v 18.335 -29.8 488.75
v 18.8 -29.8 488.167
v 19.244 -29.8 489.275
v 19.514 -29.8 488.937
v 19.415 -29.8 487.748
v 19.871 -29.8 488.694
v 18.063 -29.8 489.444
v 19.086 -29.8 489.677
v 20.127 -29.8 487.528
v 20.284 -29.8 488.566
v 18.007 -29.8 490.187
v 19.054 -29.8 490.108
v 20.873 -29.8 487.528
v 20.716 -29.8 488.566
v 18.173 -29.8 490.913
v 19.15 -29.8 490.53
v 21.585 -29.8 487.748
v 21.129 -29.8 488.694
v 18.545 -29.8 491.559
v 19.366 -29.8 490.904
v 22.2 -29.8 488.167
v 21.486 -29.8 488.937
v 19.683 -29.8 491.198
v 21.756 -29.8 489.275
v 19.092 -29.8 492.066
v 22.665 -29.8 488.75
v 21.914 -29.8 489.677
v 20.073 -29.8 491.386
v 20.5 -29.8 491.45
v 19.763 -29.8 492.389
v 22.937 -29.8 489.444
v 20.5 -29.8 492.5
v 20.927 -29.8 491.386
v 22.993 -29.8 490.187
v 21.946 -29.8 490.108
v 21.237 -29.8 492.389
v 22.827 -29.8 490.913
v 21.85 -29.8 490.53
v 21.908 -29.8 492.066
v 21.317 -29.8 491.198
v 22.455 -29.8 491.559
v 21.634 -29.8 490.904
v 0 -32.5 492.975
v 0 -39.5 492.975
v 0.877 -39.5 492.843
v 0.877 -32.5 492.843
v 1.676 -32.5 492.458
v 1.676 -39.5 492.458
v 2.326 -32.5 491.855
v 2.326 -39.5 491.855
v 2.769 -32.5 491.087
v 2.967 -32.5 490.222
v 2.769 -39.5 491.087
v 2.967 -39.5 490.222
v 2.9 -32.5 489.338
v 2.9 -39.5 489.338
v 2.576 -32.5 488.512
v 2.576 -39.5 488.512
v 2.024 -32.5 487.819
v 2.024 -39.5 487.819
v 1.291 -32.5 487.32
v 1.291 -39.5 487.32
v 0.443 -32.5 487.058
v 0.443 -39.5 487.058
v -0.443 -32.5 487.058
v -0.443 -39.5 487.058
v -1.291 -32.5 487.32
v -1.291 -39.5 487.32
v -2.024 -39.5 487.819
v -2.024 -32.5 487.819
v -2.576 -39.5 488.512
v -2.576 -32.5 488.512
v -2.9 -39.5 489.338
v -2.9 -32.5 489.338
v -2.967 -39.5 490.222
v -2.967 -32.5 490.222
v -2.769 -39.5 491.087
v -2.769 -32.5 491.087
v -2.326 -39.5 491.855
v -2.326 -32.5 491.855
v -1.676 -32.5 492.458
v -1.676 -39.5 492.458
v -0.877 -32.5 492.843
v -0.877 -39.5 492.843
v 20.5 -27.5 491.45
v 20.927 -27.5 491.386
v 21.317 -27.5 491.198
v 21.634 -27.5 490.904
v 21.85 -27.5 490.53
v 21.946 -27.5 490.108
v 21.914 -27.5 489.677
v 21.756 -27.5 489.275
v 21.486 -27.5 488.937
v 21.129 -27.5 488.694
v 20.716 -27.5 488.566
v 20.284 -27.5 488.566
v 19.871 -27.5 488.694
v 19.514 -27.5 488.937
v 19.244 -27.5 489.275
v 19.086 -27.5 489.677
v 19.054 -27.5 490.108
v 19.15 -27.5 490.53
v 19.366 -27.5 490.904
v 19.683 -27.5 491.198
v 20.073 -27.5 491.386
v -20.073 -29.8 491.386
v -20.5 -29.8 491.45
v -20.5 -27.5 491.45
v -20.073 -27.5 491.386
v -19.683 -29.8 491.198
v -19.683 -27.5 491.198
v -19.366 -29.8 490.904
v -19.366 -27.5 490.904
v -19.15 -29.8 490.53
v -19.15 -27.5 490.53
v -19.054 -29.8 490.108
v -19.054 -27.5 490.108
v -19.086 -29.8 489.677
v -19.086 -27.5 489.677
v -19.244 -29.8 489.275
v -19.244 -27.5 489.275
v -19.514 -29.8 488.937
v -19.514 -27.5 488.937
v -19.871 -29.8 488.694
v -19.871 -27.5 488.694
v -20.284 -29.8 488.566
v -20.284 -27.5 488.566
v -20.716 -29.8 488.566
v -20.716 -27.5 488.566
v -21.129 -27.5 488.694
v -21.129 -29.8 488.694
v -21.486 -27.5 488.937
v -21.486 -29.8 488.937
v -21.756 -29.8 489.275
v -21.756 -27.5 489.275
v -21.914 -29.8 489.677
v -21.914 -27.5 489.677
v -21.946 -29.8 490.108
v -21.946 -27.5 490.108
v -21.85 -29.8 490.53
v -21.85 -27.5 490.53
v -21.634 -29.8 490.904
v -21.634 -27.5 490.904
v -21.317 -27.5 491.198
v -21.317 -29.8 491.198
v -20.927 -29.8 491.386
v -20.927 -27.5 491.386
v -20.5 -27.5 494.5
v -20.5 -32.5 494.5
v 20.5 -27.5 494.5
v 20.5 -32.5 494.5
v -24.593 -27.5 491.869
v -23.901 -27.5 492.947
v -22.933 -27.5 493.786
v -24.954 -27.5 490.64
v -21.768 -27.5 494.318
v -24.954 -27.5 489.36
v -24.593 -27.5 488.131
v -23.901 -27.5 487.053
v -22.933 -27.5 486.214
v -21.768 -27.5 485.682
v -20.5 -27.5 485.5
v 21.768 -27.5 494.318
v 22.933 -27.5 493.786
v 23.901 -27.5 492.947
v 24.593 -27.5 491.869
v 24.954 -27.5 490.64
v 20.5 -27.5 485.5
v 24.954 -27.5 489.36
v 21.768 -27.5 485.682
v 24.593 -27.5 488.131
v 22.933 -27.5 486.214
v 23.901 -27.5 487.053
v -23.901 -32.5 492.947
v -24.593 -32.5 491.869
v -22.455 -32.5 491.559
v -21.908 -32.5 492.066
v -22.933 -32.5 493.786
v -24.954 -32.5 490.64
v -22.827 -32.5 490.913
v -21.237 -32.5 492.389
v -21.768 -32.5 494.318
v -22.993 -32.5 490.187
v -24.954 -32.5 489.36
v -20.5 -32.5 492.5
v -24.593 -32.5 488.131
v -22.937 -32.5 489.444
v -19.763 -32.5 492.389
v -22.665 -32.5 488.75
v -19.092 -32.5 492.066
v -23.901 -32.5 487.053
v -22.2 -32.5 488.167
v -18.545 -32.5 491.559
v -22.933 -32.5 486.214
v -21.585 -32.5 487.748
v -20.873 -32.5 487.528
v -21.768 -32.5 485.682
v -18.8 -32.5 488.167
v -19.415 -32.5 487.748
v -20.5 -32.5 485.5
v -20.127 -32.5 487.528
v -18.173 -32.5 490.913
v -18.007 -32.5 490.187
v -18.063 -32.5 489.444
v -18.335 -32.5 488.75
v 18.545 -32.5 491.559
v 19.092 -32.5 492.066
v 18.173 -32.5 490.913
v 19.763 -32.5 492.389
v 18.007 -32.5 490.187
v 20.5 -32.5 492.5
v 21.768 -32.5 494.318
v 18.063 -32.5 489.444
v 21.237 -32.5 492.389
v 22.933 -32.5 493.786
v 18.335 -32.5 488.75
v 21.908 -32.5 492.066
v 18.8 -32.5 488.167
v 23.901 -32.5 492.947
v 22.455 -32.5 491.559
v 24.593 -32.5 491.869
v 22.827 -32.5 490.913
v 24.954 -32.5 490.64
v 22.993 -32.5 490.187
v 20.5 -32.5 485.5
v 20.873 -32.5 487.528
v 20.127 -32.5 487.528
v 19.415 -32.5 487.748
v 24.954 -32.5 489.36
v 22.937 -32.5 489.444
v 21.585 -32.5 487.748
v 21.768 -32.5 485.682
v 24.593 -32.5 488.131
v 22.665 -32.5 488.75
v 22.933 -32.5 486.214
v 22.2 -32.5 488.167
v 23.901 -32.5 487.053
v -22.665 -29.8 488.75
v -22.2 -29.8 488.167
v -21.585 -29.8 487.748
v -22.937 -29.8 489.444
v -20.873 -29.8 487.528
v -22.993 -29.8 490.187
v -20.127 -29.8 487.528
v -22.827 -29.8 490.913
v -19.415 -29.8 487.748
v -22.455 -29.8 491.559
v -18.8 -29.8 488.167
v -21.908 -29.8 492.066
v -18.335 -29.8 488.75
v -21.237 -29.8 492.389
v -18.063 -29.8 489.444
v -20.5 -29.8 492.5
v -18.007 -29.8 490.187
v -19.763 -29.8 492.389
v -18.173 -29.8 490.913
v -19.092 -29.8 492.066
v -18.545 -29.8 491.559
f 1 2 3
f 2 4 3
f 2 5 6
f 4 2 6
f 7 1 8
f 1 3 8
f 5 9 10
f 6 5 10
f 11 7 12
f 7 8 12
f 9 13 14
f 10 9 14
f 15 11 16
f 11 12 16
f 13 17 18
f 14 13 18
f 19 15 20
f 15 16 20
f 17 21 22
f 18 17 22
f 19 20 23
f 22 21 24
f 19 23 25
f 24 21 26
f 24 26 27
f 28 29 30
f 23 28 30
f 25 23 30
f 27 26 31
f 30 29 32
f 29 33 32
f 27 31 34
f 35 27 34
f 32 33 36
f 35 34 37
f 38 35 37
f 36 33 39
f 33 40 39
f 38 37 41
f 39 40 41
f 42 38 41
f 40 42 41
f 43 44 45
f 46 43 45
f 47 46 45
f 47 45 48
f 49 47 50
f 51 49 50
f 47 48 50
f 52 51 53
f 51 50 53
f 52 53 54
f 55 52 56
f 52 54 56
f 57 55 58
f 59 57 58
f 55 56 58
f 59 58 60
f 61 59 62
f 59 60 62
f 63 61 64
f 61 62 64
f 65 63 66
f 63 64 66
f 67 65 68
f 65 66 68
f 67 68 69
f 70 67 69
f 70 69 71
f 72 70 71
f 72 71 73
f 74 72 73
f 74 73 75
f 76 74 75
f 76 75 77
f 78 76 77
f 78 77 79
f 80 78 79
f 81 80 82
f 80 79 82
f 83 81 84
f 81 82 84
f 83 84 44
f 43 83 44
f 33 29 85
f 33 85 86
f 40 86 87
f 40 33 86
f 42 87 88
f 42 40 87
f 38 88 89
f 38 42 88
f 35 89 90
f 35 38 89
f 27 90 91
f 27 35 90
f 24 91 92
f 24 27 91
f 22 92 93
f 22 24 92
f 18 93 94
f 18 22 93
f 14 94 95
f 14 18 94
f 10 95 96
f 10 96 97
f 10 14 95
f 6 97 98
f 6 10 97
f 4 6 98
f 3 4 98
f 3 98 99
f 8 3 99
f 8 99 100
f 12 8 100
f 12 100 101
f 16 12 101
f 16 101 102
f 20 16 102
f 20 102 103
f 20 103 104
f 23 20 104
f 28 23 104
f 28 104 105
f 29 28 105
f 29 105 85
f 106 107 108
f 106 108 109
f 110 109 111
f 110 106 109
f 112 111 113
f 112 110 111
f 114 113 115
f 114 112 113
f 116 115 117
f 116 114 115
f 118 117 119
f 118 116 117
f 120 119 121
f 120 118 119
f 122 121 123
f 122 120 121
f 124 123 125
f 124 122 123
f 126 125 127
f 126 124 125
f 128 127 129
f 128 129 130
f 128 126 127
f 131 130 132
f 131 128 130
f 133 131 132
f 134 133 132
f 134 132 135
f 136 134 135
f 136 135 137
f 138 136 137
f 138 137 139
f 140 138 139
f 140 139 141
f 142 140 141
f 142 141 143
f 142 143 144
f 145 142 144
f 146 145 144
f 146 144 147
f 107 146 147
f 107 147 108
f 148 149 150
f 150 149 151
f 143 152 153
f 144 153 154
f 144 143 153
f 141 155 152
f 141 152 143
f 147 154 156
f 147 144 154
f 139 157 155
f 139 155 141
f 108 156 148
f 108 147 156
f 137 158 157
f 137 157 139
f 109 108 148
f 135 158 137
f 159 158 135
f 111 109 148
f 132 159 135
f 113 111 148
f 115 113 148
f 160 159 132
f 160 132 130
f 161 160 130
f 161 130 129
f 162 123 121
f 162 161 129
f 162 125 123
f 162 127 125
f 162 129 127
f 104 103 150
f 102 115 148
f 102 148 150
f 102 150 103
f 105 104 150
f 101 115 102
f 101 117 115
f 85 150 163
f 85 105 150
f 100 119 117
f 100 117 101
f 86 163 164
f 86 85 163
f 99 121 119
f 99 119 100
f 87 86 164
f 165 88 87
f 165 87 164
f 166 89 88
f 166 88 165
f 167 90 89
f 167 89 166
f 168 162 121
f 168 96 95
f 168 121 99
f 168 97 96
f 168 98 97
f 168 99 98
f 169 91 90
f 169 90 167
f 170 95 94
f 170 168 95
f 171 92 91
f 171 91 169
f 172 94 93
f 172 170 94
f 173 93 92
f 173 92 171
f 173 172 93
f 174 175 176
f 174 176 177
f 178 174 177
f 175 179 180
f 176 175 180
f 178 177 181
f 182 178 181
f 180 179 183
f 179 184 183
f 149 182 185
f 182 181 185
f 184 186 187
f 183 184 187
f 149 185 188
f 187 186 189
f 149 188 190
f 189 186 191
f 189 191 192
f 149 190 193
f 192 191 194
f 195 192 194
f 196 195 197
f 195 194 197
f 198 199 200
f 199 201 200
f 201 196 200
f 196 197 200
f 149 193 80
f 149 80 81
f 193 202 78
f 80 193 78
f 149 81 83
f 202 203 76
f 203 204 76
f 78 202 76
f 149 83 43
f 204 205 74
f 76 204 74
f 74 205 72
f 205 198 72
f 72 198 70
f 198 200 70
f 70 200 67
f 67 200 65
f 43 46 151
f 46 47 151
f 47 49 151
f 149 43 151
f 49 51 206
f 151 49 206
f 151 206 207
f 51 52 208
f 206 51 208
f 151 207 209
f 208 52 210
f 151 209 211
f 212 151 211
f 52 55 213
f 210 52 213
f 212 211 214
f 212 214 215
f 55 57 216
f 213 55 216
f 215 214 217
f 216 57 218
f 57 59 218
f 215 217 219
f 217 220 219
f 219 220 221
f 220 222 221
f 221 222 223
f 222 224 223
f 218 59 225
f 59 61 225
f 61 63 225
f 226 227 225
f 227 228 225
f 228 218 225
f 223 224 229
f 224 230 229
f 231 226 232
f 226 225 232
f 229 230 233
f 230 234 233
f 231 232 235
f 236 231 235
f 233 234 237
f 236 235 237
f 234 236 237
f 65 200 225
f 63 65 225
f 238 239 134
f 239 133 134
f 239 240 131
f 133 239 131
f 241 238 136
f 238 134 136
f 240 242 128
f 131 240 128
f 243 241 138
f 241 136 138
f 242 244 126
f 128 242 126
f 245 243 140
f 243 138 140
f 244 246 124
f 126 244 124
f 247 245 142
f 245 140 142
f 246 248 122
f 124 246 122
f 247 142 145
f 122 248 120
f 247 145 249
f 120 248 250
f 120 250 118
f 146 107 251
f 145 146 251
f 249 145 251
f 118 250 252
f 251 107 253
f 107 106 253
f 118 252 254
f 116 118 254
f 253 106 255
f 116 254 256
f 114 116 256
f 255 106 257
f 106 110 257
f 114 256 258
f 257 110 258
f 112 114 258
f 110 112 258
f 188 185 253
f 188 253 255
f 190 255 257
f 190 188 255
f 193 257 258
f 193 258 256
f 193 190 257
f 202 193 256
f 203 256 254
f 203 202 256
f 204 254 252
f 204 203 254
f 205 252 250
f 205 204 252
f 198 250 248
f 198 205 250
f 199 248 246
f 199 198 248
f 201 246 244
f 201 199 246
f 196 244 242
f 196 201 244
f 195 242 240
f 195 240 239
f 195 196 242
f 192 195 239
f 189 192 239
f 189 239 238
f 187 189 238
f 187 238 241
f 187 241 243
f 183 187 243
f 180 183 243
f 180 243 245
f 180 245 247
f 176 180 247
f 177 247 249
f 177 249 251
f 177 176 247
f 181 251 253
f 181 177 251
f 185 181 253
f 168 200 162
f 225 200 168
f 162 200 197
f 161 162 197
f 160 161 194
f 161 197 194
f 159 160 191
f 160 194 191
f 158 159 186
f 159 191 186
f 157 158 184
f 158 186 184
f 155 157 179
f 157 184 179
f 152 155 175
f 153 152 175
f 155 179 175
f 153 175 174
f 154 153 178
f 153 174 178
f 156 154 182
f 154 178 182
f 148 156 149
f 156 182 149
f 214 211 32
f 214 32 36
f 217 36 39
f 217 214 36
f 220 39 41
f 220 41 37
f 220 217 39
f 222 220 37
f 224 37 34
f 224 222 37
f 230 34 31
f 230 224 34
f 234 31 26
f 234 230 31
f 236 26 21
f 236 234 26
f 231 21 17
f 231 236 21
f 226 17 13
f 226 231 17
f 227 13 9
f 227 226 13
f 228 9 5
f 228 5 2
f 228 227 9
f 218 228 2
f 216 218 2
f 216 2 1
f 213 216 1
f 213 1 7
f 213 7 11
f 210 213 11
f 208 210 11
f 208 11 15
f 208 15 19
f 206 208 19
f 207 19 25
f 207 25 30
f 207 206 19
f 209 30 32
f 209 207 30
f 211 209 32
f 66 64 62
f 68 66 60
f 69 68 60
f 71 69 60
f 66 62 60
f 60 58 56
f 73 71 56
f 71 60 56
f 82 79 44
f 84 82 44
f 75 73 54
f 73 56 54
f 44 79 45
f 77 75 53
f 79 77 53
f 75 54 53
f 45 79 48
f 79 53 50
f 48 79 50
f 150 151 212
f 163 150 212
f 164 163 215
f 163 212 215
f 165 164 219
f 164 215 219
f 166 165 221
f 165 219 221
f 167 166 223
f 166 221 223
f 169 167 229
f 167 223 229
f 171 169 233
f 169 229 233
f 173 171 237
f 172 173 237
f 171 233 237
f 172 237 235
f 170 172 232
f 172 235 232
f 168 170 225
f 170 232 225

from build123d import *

# Parameters (mm, degrees)
BARRA_START         = -32.5
SK_BARRA_W          = 41
SK_BARRA_H          = 9
BARRA_DEPTH         = 5
EXTREMOS_START      = -32.5
SK_EXTREMOS_R       = 4.5
EXTREMOS_DEPTH      = 5
PERNO_696_START     = -39.5
SK_PERNO_696_R      = 2.975
PERNO_696_DEPTH     = 7
PASANTES_M2_5_START = -32.5
SK_PASANTES_M2_5_R  = 1.45
PASANTES_M2_5_DEPTH = 5
CAJAS_M2_5_START    = -32.5
SK_CAJAS_M2_5_R     = 2.5
CAJAS_M2_5_DEPTH    = 2.7


with BuildPart() as part:
    # Sk_Barra → Barra (new body)
    with BuildSketch(Plane(origin=(0, 0, 0), x_dir=(1, 0, 0), z_dir=(0, 1, 0)).offset(BARRA_START)):
        with Locations((0, -490)):
            Rectangle(SK_BARRA_W, SK_BARRA_H)
    extrude(amount=BARRA_DEPTH)

    # Sk_Extremos → Extremos (add)
    with BuildSketch(Plane(origin=(0, 0, 0), x_dir=(1, 0, 0), z_dir=(0, 1, 0)).offset(EXTREMOS_START)):
        with Locations((-20.5, -490)):
            Circle(SK_EXTREMOS_R)
        with Locations((20.5, -490)):
            Circle(SK_EXTREMOS_R)
    extrude(amount=EXTREMOS_DEPTH)

    # Sk_Perno_696 → Perno_696 (add)
    with BuildSketch(Plane(origin=(0, 0, 0), x_dir=(1, 0, 0), z_dir=(0, 1, 0)).offset(PERNO_696_START)):
        with Locations(Location((0, -490, 0), (0, 0, 270))):
            Circle(SK_PERNO_696_R)
    extrude(amount=PERNO_696_DEPTH)

    # Sk_Pasantes_M2-5 → Pasantes_M2-5 (cut)
    with BuildSketch(Plane(origin=(0, 0, 0), x_dir=(1, 0, 0), z_dir=(0, 1, 0)).offset(PASANTES_M2_5_START)):
        with Locations(Location((-20.5, -490, 0), (0, 0, 270))):
            Circle(SK_PASANTES_M2_5_R)
        with Locations(Location((20.5, -490, 0), (0, 0, 270))):
            Circle(SK_PASANTES_M2_5_R)
    extrude(amount=PASANTES_M2_5_DEPTH, mode=Mode.SUBTRACT)

    # Sk_Cajas_M2-5 → Cajas_M2-5 (cut)
    with BuildSketch(Plane(origin=(0, 0, 0), x_dir=(1, 0, 0), z_dir=(0, 1, 0)).offset(CAJAS_M2_5_START)):
        with Locations(Location((-20.5, -490, 0), (0, 0, 270))):
            Circle(SK_CAJAS_M2_5_R)
        with Locations(Location((20.5, -490, 0), (0, 0, 270))):
            Circle(SK_CAJAS_M2_5_R)
    extrude(amount=CAJAS_M2_5_DEPTH, mode=Mode.SUBTRACT)


solid = part.part
